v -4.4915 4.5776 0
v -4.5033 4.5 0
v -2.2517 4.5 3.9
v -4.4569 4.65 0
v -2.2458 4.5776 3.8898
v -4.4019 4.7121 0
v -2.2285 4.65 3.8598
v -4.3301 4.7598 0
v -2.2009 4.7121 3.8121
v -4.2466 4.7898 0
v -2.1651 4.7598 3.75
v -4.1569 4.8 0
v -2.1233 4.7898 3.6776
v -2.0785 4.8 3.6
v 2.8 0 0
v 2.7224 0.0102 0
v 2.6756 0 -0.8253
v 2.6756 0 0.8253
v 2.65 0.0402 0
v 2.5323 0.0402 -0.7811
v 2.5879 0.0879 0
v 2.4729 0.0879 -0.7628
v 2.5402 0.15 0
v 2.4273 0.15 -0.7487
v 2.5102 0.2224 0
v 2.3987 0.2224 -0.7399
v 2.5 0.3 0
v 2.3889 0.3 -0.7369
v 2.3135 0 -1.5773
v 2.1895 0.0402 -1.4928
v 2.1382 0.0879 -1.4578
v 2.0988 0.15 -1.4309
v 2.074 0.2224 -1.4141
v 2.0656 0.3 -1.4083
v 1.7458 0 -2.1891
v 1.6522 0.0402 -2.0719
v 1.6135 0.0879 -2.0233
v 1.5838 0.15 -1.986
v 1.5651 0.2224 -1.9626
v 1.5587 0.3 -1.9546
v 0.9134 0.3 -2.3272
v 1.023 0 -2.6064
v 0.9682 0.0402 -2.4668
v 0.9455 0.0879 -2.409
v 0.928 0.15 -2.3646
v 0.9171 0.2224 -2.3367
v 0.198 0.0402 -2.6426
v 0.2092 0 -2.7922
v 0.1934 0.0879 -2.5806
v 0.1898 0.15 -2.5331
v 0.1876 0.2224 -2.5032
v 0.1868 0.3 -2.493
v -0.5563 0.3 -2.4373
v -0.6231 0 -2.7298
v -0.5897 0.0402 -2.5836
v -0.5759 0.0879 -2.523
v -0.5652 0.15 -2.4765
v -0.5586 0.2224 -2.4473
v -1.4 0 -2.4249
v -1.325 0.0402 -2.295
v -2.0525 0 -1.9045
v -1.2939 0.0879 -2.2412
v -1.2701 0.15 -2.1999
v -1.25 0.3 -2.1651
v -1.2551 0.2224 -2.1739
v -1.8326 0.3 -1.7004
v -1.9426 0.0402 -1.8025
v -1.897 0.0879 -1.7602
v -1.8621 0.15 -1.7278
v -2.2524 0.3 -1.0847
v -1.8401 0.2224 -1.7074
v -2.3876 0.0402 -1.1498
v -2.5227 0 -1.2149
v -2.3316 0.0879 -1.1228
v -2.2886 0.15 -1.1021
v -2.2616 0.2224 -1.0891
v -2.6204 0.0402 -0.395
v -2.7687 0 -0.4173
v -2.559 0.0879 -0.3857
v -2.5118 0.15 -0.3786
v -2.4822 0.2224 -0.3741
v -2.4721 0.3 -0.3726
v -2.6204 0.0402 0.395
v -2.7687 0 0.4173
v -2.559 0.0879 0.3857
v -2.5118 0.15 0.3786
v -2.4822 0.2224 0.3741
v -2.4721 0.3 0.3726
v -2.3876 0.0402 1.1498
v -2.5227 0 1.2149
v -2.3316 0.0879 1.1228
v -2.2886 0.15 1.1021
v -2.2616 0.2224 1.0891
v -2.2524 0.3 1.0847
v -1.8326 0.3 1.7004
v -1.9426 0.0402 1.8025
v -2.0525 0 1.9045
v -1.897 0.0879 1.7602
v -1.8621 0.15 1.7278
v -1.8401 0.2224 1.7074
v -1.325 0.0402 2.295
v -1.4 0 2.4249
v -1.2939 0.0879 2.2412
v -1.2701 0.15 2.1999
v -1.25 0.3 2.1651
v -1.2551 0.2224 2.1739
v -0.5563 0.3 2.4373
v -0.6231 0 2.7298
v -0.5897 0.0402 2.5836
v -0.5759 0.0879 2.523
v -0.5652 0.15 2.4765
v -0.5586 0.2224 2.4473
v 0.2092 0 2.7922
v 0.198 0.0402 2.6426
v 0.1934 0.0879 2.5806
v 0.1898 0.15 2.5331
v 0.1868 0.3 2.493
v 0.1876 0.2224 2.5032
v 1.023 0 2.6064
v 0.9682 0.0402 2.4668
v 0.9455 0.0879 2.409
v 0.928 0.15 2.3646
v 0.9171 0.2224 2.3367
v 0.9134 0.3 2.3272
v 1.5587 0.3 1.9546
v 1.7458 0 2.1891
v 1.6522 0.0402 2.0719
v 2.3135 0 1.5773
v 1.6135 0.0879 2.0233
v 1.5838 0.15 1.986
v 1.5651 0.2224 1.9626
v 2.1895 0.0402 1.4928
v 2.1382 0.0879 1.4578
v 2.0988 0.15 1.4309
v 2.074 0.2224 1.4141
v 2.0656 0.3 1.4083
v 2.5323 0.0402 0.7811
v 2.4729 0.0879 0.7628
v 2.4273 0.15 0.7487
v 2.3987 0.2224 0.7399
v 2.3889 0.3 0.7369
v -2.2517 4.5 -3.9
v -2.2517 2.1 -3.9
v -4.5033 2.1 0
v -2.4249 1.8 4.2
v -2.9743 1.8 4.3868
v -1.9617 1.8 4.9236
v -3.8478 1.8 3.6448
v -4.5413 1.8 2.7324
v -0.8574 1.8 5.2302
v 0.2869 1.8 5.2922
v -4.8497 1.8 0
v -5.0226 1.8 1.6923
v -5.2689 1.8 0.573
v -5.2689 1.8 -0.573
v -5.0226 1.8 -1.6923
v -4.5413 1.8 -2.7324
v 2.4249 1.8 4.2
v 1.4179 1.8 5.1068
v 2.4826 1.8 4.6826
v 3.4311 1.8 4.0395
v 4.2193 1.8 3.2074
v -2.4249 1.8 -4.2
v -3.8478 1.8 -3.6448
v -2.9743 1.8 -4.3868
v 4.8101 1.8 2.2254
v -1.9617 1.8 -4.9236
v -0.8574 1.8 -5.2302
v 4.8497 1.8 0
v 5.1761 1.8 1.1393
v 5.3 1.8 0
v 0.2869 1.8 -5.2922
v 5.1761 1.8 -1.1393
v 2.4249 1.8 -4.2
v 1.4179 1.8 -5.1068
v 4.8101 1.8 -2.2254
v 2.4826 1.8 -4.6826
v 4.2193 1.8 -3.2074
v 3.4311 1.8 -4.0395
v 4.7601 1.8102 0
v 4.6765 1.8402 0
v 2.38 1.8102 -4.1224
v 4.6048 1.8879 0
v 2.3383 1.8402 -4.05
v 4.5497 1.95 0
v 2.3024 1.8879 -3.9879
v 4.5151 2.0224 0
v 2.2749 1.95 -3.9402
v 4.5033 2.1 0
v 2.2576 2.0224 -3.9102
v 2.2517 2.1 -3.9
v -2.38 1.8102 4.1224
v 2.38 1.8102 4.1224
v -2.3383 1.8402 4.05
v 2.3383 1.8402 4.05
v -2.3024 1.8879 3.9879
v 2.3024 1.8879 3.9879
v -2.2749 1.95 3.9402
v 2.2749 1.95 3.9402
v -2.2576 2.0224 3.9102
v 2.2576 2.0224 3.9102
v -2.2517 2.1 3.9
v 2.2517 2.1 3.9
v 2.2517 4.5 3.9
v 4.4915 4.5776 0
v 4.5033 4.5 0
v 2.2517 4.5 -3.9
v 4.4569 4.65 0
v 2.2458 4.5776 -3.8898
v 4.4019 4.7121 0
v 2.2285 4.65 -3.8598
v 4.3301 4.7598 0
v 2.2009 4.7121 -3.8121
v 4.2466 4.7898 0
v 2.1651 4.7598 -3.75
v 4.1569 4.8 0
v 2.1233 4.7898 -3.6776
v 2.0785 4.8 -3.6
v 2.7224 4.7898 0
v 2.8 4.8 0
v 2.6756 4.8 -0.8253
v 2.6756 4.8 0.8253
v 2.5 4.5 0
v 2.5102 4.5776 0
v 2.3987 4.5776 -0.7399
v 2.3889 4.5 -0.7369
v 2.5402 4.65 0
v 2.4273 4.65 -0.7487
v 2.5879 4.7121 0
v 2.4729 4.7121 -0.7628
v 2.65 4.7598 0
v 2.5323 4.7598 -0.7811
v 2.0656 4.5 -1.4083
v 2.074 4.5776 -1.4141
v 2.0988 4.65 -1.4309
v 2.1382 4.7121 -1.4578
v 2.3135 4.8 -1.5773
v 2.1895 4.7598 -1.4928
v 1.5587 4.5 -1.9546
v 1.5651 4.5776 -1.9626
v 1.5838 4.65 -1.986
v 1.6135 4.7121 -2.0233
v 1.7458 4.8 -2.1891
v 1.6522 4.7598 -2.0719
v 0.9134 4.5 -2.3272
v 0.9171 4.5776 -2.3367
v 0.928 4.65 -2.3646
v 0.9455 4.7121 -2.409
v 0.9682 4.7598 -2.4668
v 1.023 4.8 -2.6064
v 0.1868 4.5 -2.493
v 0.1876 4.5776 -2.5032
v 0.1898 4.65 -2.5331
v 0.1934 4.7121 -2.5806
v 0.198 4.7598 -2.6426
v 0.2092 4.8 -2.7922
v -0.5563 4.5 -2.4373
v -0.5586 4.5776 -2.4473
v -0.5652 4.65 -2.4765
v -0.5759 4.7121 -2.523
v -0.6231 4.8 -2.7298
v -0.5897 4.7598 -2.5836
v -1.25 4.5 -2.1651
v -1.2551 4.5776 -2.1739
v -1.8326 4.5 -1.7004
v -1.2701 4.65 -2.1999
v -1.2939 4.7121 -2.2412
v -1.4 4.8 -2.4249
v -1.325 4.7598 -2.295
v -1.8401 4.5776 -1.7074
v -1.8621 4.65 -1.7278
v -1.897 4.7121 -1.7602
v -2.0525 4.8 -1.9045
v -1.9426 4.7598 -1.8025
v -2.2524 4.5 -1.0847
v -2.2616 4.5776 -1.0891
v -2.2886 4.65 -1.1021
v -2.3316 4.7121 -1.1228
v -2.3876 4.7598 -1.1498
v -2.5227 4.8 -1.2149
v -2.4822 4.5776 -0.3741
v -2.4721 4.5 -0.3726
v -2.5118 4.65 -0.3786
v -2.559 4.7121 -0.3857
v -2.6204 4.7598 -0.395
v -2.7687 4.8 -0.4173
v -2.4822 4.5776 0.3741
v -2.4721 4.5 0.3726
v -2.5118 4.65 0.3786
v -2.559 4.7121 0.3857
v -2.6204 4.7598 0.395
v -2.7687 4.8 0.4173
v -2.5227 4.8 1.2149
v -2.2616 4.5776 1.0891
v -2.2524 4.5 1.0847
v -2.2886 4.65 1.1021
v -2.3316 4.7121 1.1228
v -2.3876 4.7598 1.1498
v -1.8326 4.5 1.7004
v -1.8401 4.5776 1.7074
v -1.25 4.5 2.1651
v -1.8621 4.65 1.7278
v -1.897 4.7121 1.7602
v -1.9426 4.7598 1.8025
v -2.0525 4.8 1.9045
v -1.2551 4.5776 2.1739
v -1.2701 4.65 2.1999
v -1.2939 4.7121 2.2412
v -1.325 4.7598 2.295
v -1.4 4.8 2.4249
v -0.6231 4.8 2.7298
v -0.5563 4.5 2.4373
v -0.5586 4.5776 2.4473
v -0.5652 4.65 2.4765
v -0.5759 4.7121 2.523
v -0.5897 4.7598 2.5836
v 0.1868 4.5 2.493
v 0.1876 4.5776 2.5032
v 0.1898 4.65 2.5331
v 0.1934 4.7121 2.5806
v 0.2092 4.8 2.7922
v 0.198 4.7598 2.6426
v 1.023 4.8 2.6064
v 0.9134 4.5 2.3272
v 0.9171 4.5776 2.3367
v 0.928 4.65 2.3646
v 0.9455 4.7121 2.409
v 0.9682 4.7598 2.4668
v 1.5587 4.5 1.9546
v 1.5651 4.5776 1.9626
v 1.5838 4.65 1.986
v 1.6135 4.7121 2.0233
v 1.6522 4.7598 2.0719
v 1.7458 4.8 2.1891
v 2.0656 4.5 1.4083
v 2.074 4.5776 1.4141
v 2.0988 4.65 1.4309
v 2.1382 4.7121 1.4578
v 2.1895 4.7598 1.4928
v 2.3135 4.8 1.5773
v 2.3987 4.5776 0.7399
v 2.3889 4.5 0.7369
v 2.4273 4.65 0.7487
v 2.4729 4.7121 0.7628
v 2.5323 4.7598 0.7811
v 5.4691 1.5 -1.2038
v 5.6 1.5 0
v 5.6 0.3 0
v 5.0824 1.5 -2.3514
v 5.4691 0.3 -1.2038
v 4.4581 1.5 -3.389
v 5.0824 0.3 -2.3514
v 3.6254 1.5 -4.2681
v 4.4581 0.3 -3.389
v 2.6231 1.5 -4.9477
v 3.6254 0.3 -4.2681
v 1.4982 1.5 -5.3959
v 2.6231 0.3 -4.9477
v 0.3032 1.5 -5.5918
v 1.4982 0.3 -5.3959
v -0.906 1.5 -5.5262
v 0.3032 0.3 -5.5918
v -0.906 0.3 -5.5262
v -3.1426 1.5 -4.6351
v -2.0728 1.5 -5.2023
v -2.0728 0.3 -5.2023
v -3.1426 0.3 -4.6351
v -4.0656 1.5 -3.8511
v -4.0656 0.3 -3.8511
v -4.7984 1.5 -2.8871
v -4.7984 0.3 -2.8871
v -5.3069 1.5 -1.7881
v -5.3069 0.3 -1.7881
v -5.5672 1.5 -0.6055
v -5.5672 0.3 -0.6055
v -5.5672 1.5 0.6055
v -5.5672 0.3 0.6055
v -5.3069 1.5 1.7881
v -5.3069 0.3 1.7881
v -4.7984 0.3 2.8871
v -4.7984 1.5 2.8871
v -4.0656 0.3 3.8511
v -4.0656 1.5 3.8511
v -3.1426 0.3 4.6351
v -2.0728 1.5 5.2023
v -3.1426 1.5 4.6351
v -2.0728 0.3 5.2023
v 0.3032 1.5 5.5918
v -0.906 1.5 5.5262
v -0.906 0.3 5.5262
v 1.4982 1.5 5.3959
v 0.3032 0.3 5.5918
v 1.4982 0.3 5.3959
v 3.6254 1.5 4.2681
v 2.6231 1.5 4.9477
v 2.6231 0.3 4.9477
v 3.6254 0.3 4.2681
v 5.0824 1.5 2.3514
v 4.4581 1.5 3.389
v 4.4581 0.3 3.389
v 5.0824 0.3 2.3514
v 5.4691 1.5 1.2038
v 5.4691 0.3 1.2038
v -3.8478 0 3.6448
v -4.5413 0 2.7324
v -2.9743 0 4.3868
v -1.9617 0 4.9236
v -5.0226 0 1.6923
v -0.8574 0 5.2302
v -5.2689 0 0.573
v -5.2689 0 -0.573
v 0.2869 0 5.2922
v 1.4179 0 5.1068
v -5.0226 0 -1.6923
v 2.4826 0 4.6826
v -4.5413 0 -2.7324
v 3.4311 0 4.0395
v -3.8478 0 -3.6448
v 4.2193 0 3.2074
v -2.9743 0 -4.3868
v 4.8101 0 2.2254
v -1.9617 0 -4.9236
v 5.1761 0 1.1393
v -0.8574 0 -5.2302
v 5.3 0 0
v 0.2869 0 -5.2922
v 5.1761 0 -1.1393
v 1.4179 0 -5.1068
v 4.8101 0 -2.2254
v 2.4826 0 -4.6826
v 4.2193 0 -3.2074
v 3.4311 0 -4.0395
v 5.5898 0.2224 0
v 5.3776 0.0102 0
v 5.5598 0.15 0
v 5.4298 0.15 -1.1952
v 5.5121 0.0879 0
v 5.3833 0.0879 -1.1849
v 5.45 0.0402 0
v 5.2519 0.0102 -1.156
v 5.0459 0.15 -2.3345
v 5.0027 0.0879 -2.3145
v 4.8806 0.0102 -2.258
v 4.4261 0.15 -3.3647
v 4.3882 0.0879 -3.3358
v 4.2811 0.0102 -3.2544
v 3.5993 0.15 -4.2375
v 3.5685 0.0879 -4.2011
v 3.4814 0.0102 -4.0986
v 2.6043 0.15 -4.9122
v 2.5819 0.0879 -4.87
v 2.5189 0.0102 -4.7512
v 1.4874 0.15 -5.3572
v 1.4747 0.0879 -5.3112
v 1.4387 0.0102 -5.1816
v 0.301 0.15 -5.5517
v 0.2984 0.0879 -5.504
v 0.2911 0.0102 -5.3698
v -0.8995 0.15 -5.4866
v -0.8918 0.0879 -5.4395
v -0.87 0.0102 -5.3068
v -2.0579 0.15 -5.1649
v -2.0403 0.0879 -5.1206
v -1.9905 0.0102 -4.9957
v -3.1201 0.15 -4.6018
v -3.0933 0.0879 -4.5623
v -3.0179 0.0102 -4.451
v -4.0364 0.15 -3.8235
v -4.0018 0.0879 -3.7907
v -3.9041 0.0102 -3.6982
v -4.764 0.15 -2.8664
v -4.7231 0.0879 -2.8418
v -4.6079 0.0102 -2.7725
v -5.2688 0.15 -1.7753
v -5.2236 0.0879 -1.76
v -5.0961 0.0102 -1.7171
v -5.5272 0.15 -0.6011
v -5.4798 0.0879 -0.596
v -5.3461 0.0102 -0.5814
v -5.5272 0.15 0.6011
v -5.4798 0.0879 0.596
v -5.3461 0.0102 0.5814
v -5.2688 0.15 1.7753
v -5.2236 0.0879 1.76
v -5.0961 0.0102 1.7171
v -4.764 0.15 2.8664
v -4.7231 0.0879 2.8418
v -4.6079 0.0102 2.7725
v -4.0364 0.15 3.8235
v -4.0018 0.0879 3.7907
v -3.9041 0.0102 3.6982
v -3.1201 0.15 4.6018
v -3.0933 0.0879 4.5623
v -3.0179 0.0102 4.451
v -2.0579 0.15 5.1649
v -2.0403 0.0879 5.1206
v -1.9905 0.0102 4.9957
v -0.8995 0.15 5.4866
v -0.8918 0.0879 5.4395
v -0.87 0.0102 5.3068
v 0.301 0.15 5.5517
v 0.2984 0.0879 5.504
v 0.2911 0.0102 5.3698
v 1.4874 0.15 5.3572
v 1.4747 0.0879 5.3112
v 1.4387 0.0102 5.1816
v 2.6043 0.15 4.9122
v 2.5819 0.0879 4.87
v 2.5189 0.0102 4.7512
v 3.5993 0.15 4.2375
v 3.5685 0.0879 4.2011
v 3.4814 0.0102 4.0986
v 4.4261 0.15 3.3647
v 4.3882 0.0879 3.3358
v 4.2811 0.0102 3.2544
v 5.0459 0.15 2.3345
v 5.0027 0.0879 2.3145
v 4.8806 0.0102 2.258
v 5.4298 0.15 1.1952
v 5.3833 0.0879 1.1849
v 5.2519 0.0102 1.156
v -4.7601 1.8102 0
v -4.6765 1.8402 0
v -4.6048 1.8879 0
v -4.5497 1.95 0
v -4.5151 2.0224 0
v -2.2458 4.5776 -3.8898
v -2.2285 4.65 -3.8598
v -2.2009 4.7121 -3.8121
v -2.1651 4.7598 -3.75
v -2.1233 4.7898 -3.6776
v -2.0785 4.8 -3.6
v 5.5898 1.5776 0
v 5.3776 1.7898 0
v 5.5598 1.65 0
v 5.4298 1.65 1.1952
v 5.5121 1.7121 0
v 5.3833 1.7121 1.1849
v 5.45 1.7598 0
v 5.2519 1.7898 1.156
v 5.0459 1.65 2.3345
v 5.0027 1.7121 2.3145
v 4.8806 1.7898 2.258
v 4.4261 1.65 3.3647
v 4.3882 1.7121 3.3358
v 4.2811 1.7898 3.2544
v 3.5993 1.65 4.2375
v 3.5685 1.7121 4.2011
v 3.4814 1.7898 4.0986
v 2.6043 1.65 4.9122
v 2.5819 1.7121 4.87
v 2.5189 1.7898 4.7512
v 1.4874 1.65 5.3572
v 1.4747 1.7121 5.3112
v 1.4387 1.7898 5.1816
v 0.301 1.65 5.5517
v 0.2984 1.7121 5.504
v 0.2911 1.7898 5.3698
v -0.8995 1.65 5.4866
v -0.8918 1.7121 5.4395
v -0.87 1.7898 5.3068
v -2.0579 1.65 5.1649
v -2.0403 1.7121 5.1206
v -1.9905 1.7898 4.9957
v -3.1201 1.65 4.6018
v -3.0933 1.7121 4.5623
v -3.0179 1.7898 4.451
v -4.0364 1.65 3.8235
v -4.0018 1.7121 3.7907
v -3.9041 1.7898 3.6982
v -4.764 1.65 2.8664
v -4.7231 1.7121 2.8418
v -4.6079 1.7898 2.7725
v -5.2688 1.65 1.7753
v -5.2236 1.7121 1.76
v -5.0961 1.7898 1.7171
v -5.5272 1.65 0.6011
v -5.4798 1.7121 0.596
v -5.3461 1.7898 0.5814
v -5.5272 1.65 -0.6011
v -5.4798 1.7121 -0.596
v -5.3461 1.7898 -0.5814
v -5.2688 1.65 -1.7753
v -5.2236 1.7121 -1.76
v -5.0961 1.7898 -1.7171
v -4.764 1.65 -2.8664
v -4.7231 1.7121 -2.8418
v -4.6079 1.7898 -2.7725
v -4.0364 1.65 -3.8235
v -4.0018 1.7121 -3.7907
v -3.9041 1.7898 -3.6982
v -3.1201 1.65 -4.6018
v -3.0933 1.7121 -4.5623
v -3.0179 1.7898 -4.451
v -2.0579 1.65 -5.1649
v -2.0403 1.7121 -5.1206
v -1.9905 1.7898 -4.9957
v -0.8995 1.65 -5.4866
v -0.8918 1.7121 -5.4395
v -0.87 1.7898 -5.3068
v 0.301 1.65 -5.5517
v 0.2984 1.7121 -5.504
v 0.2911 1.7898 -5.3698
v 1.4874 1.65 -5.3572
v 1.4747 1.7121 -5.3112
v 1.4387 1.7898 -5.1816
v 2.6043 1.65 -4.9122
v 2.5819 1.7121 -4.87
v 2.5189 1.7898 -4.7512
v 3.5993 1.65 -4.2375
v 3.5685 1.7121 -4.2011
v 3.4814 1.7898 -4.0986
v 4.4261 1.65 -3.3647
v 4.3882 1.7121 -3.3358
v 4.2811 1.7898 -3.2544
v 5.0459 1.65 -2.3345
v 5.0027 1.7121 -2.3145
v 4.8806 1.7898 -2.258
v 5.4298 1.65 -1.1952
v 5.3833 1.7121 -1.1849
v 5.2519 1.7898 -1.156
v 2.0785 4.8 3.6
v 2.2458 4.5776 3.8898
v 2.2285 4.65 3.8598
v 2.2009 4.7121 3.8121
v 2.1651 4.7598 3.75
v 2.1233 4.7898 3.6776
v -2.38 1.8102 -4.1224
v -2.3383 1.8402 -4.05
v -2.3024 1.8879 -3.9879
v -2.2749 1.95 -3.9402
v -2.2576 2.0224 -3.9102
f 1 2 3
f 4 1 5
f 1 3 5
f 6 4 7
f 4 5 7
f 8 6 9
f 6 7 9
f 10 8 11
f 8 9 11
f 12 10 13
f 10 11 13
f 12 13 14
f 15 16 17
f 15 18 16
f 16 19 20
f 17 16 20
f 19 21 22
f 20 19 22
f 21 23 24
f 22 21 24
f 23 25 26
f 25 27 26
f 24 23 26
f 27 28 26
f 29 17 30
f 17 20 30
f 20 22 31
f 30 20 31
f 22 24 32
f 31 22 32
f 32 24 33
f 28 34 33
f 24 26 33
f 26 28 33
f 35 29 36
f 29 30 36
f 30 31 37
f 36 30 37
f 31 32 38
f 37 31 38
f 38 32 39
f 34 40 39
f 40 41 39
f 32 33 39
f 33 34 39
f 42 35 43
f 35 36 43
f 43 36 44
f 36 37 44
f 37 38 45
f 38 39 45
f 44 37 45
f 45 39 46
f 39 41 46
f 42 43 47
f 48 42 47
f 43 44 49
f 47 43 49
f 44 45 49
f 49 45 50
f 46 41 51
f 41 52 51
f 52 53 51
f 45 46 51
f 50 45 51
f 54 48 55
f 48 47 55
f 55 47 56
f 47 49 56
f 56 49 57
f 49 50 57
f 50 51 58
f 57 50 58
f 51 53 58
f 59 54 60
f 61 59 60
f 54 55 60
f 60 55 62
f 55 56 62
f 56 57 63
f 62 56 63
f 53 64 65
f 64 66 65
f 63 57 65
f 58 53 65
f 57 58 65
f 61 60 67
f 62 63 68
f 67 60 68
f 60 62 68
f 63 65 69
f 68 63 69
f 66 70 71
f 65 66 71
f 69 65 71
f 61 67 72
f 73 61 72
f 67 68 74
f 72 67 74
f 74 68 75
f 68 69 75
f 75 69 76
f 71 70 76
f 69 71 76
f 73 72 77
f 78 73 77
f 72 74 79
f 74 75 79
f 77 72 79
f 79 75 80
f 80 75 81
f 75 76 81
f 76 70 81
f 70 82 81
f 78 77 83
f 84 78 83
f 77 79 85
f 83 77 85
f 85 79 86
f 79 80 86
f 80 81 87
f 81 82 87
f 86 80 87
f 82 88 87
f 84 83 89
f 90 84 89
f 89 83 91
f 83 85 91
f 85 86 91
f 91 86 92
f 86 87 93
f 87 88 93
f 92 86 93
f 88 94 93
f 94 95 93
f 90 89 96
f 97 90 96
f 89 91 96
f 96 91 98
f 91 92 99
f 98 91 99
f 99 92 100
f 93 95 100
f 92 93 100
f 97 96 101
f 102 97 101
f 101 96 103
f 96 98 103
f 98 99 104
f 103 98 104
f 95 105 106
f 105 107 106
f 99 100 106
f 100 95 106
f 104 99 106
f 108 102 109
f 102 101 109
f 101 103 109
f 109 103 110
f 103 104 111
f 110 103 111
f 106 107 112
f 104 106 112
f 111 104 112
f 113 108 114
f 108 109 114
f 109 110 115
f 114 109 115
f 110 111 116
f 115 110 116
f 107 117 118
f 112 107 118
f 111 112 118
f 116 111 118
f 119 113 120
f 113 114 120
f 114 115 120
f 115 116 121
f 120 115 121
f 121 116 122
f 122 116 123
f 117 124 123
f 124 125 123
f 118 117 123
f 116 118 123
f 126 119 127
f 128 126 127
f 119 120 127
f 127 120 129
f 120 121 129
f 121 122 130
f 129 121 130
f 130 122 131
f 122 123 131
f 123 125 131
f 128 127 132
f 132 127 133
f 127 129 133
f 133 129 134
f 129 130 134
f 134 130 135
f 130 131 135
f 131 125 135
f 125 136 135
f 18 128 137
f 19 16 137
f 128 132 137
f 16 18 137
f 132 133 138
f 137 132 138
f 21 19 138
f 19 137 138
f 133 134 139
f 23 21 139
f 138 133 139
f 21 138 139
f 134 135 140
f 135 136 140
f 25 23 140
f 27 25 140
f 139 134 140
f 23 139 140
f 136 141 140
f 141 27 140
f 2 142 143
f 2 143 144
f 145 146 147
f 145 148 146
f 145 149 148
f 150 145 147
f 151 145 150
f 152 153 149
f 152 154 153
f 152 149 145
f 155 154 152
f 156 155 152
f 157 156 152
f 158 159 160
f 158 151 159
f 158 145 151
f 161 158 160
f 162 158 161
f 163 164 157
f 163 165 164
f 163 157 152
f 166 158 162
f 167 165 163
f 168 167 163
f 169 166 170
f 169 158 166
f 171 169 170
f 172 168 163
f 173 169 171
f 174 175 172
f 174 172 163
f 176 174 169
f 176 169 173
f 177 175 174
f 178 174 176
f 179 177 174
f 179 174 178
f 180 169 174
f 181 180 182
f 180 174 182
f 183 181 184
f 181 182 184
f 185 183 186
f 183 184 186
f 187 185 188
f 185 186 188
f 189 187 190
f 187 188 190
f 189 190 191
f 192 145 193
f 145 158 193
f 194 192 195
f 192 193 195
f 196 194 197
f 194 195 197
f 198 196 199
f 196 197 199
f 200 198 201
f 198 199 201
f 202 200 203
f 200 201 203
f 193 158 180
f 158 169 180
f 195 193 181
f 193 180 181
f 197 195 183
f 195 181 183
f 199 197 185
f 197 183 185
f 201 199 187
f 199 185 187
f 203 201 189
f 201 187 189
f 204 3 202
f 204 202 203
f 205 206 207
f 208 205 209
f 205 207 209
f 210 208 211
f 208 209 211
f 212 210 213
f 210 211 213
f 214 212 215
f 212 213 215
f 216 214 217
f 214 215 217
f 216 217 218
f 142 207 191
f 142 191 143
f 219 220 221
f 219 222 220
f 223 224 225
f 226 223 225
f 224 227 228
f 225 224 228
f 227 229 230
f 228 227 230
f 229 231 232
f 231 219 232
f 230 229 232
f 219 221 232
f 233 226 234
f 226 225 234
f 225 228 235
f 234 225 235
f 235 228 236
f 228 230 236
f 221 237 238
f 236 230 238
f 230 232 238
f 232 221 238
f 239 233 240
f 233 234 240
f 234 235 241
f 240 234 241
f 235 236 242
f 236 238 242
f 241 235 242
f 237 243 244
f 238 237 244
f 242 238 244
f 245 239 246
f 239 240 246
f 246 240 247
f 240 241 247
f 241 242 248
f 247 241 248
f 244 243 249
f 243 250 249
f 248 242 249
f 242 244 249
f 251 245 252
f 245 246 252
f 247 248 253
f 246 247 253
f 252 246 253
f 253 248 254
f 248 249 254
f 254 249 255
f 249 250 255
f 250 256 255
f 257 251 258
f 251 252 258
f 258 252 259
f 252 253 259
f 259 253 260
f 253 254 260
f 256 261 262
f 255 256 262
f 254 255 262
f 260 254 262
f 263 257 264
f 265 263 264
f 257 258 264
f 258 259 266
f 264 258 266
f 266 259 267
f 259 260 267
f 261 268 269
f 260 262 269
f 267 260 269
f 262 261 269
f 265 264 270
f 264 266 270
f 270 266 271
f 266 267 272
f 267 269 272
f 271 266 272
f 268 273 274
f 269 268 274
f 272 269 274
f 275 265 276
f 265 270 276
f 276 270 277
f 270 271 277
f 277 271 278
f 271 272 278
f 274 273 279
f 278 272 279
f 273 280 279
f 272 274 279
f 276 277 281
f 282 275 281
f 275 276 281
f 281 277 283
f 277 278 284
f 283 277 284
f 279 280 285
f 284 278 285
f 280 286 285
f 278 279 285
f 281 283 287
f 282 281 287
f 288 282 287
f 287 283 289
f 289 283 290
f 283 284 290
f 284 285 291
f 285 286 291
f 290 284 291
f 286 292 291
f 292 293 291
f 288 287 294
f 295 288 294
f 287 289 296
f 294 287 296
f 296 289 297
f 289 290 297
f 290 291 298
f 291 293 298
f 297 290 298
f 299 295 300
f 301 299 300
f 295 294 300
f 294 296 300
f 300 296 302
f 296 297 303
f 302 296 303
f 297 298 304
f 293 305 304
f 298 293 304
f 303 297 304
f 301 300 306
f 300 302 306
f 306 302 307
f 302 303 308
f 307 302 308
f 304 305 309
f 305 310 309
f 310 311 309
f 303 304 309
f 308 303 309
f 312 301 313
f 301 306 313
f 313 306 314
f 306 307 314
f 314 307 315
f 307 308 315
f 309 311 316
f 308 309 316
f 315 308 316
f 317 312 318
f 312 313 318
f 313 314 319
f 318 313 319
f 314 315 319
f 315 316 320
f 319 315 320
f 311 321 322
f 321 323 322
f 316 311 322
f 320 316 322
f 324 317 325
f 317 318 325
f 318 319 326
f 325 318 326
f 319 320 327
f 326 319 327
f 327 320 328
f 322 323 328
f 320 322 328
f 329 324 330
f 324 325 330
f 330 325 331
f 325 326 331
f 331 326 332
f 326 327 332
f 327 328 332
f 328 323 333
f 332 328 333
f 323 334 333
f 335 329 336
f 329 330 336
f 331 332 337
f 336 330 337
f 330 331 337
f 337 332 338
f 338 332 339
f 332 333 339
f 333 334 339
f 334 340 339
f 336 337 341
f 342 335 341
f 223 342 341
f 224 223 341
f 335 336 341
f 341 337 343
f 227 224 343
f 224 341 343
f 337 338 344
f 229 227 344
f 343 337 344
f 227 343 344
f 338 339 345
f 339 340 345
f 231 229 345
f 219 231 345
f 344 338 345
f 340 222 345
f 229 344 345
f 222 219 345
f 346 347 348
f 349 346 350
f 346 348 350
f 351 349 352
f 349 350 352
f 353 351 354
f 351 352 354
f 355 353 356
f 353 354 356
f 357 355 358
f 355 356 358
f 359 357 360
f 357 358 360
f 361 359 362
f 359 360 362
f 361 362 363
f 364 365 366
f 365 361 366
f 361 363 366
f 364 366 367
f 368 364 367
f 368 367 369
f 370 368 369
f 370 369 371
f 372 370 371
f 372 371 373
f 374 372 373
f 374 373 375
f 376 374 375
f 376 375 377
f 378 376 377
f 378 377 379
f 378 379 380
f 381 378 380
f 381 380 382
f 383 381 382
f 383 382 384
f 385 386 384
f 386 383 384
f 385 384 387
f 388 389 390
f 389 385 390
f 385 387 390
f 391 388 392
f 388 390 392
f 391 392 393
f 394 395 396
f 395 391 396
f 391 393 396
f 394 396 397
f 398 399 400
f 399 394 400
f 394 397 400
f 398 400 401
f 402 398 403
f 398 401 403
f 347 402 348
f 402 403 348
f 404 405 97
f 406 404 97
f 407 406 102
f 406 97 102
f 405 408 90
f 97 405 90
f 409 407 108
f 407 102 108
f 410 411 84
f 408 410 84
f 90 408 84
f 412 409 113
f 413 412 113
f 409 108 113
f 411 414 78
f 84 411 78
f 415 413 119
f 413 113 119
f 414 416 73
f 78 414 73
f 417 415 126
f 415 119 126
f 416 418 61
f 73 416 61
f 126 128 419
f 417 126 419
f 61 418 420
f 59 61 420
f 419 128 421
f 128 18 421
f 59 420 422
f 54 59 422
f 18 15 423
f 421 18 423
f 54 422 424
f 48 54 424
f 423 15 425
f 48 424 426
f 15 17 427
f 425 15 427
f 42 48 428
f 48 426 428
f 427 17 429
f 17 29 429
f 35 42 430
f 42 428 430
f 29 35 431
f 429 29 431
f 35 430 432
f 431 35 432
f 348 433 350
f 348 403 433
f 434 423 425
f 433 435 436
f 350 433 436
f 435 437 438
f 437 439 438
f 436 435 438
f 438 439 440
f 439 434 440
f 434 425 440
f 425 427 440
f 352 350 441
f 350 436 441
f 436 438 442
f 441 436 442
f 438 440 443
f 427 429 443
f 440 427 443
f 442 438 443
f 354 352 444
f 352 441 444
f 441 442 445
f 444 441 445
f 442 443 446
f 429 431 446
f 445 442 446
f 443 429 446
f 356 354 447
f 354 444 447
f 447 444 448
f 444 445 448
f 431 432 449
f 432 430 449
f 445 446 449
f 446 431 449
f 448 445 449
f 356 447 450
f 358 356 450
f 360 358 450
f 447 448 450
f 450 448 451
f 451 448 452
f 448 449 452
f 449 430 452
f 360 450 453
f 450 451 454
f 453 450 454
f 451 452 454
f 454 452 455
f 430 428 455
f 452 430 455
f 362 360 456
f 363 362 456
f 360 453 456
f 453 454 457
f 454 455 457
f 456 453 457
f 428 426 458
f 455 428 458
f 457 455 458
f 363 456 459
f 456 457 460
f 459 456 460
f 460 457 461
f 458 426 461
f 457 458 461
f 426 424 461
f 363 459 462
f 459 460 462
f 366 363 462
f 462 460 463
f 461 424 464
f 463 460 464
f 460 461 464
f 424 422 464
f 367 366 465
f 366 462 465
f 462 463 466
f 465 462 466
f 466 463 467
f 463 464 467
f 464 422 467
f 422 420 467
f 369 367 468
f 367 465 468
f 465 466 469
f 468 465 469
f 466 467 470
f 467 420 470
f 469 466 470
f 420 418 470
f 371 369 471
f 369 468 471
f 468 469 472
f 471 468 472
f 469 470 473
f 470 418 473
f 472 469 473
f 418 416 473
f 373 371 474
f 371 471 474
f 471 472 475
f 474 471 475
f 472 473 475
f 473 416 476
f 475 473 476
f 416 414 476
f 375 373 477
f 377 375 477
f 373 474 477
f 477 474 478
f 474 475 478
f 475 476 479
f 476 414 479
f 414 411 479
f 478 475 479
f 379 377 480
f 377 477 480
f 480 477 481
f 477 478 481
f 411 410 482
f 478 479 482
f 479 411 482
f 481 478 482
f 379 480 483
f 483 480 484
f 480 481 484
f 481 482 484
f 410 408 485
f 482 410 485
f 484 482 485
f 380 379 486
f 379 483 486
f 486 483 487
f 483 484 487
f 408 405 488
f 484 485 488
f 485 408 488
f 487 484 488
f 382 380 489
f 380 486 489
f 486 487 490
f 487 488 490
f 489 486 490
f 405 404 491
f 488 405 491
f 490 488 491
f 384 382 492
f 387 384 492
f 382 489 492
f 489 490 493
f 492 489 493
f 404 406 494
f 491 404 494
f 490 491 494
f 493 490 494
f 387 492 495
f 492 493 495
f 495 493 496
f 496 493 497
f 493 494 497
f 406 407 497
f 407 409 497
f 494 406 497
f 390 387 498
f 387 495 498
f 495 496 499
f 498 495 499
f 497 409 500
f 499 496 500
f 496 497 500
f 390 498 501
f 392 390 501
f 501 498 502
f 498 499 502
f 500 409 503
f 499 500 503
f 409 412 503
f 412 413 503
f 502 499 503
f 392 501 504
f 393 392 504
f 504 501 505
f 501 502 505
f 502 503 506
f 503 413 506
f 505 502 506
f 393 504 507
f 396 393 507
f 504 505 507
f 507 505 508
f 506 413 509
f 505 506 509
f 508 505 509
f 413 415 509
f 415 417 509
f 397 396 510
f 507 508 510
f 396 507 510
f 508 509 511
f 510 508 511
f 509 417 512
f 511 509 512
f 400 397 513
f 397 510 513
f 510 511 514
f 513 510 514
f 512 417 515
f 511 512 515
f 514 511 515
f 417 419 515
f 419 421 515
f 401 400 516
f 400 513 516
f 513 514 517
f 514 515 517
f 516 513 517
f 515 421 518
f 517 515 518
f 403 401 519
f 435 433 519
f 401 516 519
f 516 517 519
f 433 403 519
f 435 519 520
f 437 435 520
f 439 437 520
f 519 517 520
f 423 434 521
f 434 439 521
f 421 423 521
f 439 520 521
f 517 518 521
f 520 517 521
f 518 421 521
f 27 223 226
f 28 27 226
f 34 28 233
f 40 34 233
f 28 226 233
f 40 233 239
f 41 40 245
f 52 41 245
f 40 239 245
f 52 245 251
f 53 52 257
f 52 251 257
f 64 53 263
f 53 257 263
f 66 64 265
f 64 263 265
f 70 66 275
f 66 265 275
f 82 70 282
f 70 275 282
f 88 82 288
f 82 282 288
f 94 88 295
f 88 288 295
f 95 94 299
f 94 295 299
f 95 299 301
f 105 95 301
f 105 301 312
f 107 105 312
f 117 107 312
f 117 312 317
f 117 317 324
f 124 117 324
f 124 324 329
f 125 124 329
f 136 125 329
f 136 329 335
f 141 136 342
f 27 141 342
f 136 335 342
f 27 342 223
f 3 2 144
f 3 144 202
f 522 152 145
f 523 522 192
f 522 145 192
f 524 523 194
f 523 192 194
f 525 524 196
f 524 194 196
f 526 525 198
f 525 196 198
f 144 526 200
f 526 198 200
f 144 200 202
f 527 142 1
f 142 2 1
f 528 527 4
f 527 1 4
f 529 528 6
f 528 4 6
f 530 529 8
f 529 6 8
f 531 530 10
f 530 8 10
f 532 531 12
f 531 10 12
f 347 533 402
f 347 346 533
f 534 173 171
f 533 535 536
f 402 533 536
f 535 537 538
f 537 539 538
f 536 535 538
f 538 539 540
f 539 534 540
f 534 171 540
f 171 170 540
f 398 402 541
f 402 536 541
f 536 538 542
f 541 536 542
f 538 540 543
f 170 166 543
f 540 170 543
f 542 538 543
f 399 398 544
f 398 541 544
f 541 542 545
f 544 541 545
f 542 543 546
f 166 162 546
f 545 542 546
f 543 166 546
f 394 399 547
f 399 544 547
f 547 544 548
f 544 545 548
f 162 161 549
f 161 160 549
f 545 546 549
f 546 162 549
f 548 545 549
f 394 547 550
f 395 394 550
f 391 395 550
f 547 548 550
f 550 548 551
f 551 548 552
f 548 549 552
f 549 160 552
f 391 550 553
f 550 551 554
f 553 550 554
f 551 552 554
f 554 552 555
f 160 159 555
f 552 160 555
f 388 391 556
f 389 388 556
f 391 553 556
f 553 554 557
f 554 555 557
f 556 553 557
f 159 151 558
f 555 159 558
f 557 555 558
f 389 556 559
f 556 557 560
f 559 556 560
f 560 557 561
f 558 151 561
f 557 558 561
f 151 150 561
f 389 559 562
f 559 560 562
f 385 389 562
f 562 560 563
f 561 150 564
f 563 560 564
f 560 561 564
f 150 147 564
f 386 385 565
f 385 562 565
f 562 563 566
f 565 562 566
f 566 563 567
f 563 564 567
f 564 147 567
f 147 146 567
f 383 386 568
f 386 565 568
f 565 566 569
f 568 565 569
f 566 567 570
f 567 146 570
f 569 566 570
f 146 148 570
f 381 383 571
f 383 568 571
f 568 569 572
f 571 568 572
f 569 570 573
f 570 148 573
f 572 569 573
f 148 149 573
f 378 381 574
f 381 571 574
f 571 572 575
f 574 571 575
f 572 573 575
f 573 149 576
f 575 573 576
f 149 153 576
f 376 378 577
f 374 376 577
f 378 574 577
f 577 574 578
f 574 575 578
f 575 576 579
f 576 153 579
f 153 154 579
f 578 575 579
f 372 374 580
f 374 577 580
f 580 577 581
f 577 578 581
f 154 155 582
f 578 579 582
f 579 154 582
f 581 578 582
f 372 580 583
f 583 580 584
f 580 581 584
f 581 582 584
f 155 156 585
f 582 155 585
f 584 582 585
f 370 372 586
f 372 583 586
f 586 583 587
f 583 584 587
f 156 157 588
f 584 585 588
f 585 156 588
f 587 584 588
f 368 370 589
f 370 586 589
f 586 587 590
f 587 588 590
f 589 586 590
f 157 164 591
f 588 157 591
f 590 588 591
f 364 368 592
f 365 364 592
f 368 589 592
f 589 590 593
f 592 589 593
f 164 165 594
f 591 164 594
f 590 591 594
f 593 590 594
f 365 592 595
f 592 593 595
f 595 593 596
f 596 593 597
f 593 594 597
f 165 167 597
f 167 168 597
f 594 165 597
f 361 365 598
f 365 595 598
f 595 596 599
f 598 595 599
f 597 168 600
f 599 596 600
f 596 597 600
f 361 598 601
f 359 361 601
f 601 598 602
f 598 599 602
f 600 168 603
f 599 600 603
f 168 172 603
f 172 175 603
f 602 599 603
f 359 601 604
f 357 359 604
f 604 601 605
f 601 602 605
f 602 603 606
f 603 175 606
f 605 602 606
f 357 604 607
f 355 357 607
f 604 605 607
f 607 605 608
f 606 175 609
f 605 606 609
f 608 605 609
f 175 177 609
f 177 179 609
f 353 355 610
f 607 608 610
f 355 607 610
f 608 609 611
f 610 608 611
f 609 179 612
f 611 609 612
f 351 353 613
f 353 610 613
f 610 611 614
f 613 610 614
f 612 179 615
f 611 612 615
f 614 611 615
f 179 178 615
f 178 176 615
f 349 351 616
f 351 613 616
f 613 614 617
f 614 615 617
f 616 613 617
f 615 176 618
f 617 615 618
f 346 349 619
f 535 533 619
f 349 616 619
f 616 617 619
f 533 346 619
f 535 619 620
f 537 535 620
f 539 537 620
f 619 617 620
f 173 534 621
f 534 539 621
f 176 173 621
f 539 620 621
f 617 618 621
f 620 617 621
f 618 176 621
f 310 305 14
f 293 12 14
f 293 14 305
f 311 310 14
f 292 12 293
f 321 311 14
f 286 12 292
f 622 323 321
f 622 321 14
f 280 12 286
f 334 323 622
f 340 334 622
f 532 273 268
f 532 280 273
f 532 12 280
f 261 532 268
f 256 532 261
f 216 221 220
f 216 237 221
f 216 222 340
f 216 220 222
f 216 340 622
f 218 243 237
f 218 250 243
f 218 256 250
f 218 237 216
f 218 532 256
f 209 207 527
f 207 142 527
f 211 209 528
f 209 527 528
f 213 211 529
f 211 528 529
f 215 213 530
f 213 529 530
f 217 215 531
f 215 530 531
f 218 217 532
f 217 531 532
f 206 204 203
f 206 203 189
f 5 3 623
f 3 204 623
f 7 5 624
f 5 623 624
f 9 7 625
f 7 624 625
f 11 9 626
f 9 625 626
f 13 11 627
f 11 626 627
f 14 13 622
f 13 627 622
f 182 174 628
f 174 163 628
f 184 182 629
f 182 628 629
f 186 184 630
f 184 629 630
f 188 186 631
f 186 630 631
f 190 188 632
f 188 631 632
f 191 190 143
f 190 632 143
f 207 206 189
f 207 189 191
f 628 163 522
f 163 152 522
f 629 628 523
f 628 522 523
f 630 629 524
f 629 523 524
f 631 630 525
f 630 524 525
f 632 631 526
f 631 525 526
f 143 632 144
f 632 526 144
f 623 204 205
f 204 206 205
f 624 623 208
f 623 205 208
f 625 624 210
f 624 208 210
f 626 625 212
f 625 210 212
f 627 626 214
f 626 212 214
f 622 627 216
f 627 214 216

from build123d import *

# Parameters (mm, degrees)
SKETCH1_R           = 5.6
BOSS_EXTRUDE1_DEPTH = 4.8
SKETCH2_R           = 2.5
CUT_EXTRUDE1_DEPTH  = 4.8
SKETCH3_OUTSIDE_W   = 16.51
SKETCH3_OUTSIDE_H   = 16.51
CUT_EXTRUDE2_DEPTH  = 3
FILLET1_R           = 0.3


with BuildPart() as part:
    # Sketch1 → Boss-Extrude1 (new body)
    with BuildSketch(Plane(origin=(0, 0, 0), x_dir=(1, 0, 0), z_dir=(0, 1, 0))):
        Circle(SKETCH1_R)
    extrude(amount=BOSS_EXTRUDE1_DEPTH)

    # Sketch2 → Cut-Extrude1 (cut)
    with BuildSketch(Plane(origin=(0, 4.8, 0), x_dir=(1, 0, 0), z_dir=(0, 1, 0))):
        Circle(SKETCH2_R)
    extrude(amount=-CUT_EXTRUDE1_DEPTH, mode=Mode.SUBTRACT)

    # Sketch3 outside → Cut-Extrude2 (cut)
    with BuildSketch(Plane(origin=(0, 4.8, 0), x_dir=(1, 0, 0), z_dir=(0, 1, 0))):
        Rectangle(SKETCH3_OUTSIDE_W, SKETCH3_OUTSIDE_H)
        Polygon((4.5033321, 0), (2.25166605, 3.9), (-2.25166605, 3.9), (-4.5033321, 0), (-2.25166605, -3.9), (2.25166605, -3.9), align=None, mode=Mode.SUBTRACT)
    extrude(amount=-CUT_EXTRUDE2_DEPTH, mode=Mode.SUBTRACT)

    # Fillet1
    fillet1_edges = [part.edges().sort_by_distance(p)[0] for p in [
        (0, 1.8, 3.9),
        (3.377499075, 1.8, 1.95),
        (3.377499075, 1.8, -1.95),
        (0, 1.8, -3.9),
        (-3.377499075, 1.8, -1.95),
        (-3.377499075, 1.8, 1.95),
        (-5.6, 1.8, 0),
        (-5.6, 0, 0),
        (3.377499075, 4.8, 1.95),
        (0, 4.8, 3.9),
        (-3.377499075, 4.8, 1.95),
        (-3.377499075, 4.8, -1.95),
        (0, 4.8, -3.9),
        (3.377499075, 4.8, -1.95),
        (-2.5, 0, 0),
        (-2.5, 4.8, 0),
    ]]
    fillet(fillet1_edges, radius=FILLET1_R)


solid = part.part
